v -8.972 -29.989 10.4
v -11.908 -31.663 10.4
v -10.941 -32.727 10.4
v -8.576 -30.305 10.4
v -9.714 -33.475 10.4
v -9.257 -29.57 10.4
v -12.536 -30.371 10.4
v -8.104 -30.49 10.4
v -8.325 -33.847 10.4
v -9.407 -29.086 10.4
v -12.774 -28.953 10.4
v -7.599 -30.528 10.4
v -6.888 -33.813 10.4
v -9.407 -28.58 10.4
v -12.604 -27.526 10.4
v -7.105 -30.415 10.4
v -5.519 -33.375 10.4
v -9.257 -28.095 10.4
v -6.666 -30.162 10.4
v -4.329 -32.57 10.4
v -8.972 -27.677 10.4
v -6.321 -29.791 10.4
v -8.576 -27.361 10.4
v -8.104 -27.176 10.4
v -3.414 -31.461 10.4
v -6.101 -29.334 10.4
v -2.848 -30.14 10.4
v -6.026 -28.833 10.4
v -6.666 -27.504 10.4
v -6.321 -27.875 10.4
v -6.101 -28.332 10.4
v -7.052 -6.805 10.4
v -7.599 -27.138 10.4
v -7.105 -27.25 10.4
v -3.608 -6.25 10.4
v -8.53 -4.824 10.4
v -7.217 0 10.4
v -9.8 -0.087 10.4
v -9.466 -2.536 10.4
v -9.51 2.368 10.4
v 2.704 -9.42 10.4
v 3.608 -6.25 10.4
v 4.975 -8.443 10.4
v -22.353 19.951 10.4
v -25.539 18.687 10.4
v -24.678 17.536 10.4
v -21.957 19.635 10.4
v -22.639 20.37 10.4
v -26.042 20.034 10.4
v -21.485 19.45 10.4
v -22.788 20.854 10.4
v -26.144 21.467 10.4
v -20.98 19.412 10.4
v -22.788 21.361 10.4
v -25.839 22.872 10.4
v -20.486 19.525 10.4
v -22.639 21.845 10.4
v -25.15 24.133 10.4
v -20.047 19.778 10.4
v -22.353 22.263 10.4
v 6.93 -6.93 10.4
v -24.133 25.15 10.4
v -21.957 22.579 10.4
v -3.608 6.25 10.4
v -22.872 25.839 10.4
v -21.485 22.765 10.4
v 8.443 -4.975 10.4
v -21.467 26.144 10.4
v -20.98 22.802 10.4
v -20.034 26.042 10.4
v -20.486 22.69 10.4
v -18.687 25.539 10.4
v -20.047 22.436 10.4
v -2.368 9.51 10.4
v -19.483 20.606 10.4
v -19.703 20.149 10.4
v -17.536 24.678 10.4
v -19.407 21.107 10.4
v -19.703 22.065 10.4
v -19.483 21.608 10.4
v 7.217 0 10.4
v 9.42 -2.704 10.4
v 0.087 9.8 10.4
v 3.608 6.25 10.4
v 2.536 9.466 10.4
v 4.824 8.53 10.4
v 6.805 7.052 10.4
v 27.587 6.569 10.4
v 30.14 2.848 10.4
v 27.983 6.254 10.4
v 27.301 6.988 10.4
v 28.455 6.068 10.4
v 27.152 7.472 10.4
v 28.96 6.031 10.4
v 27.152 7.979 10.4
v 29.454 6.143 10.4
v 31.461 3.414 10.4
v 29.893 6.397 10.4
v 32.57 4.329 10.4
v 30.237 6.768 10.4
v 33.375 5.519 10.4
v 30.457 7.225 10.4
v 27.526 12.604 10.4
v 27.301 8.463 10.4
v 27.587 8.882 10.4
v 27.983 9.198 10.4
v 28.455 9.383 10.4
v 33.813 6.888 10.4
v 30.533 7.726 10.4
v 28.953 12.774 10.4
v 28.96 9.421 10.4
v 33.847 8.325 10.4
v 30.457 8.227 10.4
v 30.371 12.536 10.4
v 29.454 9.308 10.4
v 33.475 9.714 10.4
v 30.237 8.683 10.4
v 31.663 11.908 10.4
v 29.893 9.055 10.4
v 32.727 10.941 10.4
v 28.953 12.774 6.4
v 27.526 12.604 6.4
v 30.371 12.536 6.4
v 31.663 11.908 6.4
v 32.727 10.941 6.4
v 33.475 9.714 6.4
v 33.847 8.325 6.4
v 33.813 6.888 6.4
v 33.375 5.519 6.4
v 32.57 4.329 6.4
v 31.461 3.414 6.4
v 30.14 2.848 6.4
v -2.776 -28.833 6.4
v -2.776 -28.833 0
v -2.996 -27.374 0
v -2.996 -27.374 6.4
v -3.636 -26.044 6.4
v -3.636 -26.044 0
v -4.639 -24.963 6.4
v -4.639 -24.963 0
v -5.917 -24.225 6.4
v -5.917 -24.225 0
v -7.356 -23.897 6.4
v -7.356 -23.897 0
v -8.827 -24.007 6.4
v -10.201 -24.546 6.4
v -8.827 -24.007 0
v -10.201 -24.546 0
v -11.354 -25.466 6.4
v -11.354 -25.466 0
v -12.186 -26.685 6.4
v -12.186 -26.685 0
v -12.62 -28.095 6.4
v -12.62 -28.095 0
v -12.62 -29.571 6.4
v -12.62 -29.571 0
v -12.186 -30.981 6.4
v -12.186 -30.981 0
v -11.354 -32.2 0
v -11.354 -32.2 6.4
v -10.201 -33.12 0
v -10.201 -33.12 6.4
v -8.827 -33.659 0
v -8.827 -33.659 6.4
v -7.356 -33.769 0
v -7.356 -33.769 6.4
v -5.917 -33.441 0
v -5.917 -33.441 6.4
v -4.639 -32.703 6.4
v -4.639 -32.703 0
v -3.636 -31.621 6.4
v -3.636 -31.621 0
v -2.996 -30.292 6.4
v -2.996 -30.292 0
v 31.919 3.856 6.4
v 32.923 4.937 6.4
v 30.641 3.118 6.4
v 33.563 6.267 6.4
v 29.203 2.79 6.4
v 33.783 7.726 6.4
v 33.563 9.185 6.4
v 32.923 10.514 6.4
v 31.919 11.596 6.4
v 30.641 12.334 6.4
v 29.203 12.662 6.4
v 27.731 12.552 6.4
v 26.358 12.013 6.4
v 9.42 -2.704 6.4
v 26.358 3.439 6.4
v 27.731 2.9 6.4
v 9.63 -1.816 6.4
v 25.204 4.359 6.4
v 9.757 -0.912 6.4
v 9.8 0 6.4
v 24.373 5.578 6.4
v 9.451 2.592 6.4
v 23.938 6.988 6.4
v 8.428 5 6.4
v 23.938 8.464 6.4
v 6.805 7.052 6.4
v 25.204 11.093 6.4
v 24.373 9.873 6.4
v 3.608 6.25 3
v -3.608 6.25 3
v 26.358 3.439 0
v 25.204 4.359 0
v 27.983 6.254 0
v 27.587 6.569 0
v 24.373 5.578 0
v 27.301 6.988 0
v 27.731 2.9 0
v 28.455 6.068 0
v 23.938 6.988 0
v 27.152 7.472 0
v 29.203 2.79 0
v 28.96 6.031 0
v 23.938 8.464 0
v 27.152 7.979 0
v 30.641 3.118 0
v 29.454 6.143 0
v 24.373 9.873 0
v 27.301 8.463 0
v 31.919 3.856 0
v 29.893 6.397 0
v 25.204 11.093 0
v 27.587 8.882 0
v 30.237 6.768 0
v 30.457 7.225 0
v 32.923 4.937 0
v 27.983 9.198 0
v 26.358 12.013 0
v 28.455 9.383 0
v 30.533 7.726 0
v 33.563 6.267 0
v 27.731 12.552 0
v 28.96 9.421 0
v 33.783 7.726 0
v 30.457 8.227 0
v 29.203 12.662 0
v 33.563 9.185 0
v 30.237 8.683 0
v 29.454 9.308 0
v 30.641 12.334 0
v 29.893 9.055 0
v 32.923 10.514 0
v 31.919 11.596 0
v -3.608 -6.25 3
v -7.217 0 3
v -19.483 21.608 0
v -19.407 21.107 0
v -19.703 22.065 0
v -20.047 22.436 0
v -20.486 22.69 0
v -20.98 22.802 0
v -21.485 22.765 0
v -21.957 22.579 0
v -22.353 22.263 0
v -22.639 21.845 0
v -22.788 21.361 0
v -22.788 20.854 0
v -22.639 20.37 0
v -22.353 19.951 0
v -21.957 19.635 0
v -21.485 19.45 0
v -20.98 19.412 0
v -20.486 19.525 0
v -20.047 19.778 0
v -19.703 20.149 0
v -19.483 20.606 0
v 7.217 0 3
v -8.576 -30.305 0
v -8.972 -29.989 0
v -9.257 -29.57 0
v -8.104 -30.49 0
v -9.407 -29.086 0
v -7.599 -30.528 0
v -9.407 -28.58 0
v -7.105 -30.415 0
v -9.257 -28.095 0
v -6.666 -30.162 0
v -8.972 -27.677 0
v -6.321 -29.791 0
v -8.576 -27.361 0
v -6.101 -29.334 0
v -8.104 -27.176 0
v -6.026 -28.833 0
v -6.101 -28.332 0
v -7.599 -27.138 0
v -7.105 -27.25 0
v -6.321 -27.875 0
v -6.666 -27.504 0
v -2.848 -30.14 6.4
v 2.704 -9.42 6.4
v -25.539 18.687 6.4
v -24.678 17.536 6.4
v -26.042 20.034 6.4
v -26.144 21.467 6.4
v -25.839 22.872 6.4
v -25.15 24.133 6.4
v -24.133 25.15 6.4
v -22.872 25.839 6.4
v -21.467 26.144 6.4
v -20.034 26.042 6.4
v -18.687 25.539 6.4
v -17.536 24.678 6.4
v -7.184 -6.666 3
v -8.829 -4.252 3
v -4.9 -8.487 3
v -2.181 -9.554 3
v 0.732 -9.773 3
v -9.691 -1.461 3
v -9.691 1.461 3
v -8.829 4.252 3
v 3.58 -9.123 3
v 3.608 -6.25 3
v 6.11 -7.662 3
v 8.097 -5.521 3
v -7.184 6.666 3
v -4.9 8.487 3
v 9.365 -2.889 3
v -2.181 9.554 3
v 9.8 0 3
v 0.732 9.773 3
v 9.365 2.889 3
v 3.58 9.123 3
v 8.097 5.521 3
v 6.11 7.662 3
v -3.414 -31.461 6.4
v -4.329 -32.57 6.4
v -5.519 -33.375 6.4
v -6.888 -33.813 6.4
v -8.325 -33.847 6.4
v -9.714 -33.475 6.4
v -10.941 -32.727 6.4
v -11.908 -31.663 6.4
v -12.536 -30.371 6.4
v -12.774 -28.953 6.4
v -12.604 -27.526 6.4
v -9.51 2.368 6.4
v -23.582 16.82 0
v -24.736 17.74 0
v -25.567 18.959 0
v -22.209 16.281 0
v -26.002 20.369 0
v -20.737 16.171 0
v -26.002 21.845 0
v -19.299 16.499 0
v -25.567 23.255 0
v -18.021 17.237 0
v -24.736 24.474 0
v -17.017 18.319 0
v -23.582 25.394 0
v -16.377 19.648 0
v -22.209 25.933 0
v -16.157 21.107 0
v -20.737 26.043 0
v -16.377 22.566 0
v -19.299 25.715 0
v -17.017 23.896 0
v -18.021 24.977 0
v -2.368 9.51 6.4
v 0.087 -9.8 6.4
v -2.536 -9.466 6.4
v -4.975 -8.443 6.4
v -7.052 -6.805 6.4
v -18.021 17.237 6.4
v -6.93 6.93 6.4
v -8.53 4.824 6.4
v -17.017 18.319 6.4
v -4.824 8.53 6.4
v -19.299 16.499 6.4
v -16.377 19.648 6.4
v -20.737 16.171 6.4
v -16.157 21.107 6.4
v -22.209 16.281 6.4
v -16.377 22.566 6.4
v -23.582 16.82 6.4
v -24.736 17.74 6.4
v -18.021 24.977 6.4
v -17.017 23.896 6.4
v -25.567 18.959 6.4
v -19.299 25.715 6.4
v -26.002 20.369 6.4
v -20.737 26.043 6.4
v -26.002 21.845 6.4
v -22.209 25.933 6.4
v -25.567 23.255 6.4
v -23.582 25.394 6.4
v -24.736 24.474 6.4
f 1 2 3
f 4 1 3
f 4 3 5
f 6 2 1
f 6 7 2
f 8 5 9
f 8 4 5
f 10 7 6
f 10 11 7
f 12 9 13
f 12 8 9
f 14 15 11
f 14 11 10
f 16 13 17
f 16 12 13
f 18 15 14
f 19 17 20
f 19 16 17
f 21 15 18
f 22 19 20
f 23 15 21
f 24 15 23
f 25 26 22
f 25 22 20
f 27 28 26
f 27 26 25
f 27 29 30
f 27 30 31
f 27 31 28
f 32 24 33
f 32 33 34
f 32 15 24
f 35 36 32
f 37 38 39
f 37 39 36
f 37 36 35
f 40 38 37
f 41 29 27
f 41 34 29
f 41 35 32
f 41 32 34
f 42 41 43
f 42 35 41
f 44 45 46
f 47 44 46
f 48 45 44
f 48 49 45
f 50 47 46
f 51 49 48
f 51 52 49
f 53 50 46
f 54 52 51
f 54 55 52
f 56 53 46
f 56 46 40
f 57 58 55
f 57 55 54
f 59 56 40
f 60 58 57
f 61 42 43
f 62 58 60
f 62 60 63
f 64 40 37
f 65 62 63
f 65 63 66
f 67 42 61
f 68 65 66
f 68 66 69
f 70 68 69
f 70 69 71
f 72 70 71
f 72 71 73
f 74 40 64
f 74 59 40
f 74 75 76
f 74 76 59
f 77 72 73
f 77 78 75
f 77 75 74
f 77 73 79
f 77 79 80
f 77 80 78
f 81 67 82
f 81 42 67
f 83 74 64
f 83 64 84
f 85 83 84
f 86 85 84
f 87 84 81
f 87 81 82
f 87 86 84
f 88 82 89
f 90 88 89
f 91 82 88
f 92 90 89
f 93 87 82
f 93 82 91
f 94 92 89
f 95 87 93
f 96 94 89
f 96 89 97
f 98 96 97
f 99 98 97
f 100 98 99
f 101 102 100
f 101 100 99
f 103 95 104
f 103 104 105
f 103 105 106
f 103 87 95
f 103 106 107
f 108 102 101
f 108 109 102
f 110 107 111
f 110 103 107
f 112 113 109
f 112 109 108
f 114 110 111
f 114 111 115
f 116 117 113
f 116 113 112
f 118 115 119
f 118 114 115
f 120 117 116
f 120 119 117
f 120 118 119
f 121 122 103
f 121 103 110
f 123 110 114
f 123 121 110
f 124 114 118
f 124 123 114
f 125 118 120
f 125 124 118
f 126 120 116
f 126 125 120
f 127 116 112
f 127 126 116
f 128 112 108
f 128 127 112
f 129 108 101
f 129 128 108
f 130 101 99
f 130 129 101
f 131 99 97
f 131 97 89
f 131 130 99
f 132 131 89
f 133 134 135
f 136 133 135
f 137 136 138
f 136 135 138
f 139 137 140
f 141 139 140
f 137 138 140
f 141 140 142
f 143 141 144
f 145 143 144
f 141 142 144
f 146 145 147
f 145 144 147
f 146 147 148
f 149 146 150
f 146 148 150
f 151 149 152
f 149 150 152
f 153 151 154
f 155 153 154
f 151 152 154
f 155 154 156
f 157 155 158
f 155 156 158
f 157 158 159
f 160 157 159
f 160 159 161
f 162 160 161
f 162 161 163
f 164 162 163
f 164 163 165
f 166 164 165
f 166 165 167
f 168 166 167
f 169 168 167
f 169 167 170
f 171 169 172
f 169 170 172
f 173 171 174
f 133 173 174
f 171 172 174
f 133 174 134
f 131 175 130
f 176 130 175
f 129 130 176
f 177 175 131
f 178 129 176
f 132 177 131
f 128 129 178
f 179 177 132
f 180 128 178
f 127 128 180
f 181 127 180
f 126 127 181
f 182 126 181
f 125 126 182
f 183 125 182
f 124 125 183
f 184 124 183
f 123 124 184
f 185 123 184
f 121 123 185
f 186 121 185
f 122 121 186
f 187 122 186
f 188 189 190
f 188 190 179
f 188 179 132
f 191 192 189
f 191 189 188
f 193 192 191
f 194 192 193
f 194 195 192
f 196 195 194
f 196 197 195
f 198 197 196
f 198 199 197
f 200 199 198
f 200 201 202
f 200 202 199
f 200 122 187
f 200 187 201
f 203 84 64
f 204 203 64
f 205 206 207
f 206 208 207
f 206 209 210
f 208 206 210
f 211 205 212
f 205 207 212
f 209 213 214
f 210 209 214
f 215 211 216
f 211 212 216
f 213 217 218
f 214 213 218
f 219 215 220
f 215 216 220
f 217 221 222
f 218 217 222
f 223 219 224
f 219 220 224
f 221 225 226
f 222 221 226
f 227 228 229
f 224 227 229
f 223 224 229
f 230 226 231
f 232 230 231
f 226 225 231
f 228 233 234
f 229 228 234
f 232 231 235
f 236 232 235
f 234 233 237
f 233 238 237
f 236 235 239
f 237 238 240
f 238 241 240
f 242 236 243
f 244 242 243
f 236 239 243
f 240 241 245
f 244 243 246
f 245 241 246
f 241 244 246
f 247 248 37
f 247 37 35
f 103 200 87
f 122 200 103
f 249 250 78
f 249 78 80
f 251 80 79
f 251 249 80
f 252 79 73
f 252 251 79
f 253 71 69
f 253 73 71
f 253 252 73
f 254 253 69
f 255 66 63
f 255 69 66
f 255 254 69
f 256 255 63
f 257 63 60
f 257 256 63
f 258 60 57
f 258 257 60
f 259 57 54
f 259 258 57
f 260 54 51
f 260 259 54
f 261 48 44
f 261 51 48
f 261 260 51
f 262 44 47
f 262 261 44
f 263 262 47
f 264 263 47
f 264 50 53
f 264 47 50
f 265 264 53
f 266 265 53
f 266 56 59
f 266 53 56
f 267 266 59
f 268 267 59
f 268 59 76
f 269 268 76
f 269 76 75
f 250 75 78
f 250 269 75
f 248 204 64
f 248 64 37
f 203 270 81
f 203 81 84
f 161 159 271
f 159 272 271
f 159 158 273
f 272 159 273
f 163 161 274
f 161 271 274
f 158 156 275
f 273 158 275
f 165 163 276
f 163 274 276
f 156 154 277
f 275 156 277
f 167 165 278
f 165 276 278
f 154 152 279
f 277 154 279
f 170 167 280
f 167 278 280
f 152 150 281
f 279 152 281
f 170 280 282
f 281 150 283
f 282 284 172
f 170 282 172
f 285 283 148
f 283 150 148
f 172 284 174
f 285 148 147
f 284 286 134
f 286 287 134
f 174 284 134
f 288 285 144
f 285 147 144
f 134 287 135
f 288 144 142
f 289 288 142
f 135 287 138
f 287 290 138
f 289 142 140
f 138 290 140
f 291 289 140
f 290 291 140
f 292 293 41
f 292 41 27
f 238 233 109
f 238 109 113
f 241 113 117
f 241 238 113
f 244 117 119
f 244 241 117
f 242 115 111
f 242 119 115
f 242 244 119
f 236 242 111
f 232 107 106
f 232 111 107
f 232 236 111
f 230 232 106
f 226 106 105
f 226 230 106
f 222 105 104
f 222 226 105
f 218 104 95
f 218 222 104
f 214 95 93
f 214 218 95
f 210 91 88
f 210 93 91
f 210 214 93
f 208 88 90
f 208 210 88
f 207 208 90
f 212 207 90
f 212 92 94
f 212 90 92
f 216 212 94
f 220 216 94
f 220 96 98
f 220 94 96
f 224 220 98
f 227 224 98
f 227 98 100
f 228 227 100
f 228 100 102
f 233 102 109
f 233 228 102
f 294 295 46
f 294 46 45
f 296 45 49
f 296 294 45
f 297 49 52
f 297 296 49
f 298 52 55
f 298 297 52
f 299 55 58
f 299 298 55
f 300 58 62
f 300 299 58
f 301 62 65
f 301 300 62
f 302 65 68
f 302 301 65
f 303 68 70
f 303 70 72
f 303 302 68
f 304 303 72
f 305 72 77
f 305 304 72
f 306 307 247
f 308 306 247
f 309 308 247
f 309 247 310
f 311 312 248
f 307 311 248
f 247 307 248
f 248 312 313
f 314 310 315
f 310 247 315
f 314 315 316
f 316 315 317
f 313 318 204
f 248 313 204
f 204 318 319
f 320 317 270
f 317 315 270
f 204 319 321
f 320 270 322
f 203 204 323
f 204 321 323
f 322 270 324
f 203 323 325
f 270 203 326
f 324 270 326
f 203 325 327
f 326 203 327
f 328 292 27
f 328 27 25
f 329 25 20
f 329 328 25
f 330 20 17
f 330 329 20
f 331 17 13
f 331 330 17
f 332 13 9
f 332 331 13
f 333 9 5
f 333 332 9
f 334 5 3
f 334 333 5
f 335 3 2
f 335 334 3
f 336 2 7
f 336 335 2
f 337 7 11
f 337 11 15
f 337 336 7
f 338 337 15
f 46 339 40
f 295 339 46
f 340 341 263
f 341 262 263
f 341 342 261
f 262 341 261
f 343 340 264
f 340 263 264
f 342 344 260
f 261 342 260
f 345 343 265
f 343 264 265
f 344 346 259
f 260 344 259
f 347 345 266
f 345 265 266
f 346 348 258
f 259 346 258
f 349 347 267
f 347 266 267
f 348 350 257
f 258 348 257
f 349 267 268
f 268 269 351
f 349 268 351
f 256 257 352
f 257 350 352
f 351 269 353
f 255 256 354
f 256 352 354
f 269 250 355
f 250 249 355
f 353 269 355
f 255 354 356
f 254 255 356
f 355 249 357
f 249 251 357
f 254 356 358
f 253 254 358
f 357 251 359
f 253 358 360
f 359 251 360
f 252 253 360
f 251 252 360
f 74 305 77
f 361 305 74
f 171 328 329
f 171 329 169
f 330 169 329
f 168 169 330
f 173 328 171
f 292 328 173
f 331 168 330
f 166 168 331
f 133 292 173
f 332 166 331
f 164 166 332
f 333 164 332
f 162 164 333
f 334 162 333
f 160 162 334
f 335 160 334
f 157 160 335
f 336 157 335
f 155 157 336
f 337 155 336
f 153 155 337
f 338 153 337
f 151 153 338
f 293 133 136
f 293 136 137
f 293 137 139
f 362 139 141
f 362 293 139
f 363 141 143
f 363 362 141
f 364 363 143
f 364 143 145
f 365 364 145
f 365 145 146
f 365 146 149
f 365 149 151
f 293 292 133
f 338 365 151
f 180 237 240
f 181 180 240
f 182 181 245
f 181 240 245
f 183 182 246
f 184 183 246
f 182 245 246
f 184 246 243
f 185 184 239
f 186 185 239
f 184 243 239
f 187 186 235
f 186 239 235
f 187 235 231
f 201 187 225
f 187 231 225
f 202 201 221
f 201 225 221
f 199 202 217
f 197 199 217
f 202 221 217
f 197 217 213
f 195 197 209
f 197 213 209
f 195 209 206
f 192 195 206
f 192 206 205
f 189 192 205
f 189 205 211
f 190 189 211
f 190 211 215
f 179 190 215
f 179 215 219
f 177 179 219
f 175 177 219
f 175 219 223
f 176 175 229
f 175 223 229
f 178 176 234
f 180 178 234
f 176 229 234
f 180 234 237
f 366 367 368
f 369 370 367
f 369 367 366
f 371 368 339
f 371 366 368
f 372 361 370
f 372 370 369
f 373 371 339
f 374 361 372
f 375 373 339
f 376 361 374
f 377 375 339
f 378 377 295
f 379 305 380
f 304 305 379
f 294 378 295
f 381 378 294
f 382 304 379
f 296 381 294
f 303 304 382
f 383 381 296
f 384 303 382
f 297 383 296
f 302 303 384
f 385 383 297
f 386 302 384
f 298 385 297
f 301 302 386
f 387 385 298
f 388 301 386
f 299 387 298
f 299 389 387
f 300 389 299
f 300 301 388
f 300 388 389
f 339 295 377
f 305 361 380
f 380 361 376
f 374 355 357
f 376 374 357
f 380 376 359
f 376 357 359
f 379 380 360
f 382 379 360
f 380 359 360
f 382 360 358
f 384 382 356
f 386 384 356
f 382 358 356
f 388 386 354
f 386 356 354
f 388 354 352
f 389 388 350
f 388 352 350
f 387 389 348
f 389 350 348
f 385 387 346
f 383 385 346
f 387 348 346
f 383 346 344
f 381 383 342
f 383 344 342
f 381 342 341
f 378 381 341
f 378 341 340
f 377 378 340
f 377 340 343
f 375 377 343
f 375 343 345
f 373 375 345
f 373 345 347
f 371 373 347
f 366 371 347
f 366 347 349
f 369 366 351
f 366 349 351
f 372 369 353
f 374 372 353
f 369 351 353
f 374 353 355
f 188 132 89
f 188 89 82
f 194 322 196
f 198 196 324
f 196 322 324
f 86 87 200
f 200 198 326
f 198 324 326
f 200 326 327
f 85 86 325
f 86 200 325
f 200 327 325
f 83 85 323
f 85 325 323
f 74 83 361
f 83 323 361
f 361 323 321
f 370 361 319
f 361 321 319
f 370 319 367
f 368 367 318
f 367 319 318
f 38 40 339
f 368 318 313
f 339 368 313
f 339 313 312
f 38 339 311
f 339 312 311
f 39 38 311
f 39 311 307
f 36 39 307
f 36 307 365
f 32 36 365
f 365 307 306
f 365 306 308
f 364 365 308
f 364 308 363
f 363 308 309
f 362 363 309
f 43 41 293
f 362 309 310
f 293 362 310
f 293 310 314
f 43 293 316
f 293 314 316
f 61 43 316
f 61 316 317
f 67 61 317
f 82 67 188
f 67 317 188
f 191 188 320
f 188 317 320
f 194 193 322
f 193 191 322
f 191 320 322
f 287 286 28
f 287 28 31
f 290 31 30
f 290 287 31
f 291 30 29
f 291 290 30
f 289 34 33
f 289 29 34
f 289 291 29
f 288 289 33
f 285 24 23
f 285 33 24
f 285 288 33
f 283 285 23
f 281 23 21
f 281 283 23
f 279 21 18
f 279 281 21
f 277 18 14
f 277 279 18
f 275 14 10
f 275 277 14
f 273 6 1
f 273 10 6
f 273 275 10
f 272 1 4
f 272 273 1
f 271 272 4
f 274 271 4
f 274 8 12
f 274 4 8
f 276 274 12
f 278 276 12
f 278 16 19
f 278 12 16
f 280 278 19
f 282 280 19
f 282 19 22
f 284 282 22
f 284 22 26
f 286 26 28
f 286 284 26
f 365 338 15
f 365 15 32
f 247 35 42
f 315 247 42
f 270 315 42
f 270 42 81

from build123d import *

# Parameters (mm, degrees)
F_01_START                                = 3
S01_HEX_COUPLING_BOSS_R                   = 9.8
F_01_HEX_COUPLING_BOSS_DEPTH              = 7.4
F_02_START                                = 6.4
F_02_DRIVE_SPOKE_1_DEPTH                  = 4
S03_FLANGE_STANDOFF_1_R                   = 4.95
F_03_FLANGE_STANDOFF_1_DEPTH              = 6.4
F_04_START                                = 6.4
F_04_DRIVE_SPOKE_2_DEPTH                  = 4
S05_FLANGE_STANDOFF_2_R                   = 4.95
F_05_FLANGE_STANDOFF_2_DEPTH              = 6.4
F_06_START                                = 6.4
F_06_DRIVE_SPOKE_3_DEPTH                  = 4
S07_FLANGE_STANDOFF_3_R                   = 4.95
F_07_FLANGE_STANDOFF_3_DEPTH              = 6.4
F_08_START                                = 0.1
F_08_FLOATING_12_MM_AF_DRIVE_SOCKET_DEPTH = 10.6
F_09_START                                = -0.1
S09_THREE_SHARED_THROUGH_FASTENERS_R      = 1.7
F_09_THREE_SHARED_THROUGH_FASTENERS_DEPTH = 10.6


with BuildPart() as part:
    # S01 - Hex coupling boss → 01 - Hex coupling boss (new body)
    with BuildSketch(Plane.XY.offset(F_01_START)):
        Circle(S01_HEX_COUPLING_BOSS_R)
    extrude(amount=F_01_HEX_COUPLING_BOSS_DEPTH)

    # S02 - Drive spoke 1 → 02 - Drive spoke 1 (add)
    with BuildSketch(Plane.XY.offset(F_02_START)):
        with BuildLine():
            Line((5.901185301, 6.809362547), (27.525849737, 12.603673919))
            ThreePointArc((27.525849737, 12.603673919), (33.710811337, 9.032784674), (30.139922092, 2.847823074))
            Line((30.139922092, 2.847823074), (8.515257656, -2.946488299))
            ThreePointArc((8.515257656, -2.946488299), (2.330296056, 0.624400946), (5.901185301, 6.809362547))
        make_face()
    extrude(amount=F_02_DRIVE_SPOKE_1_DEPTH)

    # S03 - Flange standoff 1 → 03 - Flange standoff 1 (add)
    with BuildSketch(Plane.XY):
        with Locations((28.832885915, 7.725748496)):
            Circle(S03_FLANGE_STANDOFF_1_R)
    extrude(amount=F_03_FLANGE_STANDOFF_1_DEPTH)

    # S04 - Drive spoke 2 → 04 - Drive spoke 2 (add)
    with BuildSketch(Plane.XY.offset(F_04_START)):
        with BuildLine():
            Line((-8.8476736, 1.70589511), (-24.678026663, 17.536248173))
            ThreePointArc((-24.678026663, 17.536248173), (-24.678026663, 24.678026663), (-17.536248173, 24.678026663))
            Line((-17.536248173, 24.678026663), (-1.70589511, 8.8476736))
            ThreePointArc((-1.70589511, 8.8476736), (-1.70589511, 1.70589511), (-8.8476736, 1.70589511))
        make_face()
    extrude(amount=F_04_DRIVE_SPOKE_2_DEPTH)

    # S05 - Flange standoff 2 → 05 - Flange standoff 2 (add)
    with BuildSketch(Plane.XY):
        with Locations((-21.107137418, 21.107137418)):
            Circle(S05_FLANGE_STANDOFF_2_R)
    extrude(amount=F_05_FLANGE_STANDOFF_2_DEPTH)

    # S06 - Drive spoke 3 → 06 - Drive spoke 3 (add)
    with BuildSketch(Plane.XY.offset(F_06_START)):
        with BuildLine():
            Line((2.946488299, -8.515257656), (-2.847823074, -30.139922092))
            ThreePointArc((-2.847823074, -30.139922092), (-9.032784674, -33.710811337), (-12.603673919, -27.525849737))
            Line((-12.603673919, -27.525849737), (-6.809362547, -5.901185301))
            ThreePointArc((-6.809362547, -5.901185301), (-0.624400946, -2.330296056), (2.946488299, -8.515257656))
        make_face()
    extrude(amount=F_06_DRIVE_SPOKE_3_DEPTH)

    # S07 - Flange standoff 3 → 07 - Flange standoff 3 (add)
    with BuildSketch(Plane.XY):
        with Locations((-7.725748496, -28.832885915)):
            Circle(S07_FLANGE_STANDOFF_3_R)
    extrude(amount=F_07_FLANGE_STANDOFF_3_DEPTH)

    # S08 - Floating 12 mm AF drive socket → 08 - Floating 12 mm AF drive socket (cut)
    with BuildSketch(Plane.XY.offset(F_08_START)):
        Polygon((7.216878365, 0), (3.608439182, 6.25), (-3.608439182, 6.25), (-7.216878365, 0), (-3.608439182, -6.25), (3.608439182, -6.25), align=None)
    extrude(amount=F_08_FLOATING_12_MM_AF_DRIVE_SOCKET_DEPTH, mode=Mode.SUBTRACT)

    # S09 - Three shared through-fasteners → 09 - Three shared through-fasteners (cut)
    with BuildSketch(Plane.XY.offset(F_09_START)):
        with Locations((28.832885915, 7.725748496)):
            Circle(S09_THREE_SHARED_THROUGH_FASTENERS_R)
        with Locations((-21.107137418, 21.107137418)):
            Circle(S09_THREE_SHARED_THROUGH_FASTENERS_R)
        with Locations((-7.725748496, -28.832885915)):
            Circle(S09_THREE_SHARED_THROUGH_FASTENERS_R)
    extrude(amount=F_09_THREE_SHARED_THROUGH_FASTENERS_DEPTH, mode=Mode.SUBTRACT)


solid = part.part
